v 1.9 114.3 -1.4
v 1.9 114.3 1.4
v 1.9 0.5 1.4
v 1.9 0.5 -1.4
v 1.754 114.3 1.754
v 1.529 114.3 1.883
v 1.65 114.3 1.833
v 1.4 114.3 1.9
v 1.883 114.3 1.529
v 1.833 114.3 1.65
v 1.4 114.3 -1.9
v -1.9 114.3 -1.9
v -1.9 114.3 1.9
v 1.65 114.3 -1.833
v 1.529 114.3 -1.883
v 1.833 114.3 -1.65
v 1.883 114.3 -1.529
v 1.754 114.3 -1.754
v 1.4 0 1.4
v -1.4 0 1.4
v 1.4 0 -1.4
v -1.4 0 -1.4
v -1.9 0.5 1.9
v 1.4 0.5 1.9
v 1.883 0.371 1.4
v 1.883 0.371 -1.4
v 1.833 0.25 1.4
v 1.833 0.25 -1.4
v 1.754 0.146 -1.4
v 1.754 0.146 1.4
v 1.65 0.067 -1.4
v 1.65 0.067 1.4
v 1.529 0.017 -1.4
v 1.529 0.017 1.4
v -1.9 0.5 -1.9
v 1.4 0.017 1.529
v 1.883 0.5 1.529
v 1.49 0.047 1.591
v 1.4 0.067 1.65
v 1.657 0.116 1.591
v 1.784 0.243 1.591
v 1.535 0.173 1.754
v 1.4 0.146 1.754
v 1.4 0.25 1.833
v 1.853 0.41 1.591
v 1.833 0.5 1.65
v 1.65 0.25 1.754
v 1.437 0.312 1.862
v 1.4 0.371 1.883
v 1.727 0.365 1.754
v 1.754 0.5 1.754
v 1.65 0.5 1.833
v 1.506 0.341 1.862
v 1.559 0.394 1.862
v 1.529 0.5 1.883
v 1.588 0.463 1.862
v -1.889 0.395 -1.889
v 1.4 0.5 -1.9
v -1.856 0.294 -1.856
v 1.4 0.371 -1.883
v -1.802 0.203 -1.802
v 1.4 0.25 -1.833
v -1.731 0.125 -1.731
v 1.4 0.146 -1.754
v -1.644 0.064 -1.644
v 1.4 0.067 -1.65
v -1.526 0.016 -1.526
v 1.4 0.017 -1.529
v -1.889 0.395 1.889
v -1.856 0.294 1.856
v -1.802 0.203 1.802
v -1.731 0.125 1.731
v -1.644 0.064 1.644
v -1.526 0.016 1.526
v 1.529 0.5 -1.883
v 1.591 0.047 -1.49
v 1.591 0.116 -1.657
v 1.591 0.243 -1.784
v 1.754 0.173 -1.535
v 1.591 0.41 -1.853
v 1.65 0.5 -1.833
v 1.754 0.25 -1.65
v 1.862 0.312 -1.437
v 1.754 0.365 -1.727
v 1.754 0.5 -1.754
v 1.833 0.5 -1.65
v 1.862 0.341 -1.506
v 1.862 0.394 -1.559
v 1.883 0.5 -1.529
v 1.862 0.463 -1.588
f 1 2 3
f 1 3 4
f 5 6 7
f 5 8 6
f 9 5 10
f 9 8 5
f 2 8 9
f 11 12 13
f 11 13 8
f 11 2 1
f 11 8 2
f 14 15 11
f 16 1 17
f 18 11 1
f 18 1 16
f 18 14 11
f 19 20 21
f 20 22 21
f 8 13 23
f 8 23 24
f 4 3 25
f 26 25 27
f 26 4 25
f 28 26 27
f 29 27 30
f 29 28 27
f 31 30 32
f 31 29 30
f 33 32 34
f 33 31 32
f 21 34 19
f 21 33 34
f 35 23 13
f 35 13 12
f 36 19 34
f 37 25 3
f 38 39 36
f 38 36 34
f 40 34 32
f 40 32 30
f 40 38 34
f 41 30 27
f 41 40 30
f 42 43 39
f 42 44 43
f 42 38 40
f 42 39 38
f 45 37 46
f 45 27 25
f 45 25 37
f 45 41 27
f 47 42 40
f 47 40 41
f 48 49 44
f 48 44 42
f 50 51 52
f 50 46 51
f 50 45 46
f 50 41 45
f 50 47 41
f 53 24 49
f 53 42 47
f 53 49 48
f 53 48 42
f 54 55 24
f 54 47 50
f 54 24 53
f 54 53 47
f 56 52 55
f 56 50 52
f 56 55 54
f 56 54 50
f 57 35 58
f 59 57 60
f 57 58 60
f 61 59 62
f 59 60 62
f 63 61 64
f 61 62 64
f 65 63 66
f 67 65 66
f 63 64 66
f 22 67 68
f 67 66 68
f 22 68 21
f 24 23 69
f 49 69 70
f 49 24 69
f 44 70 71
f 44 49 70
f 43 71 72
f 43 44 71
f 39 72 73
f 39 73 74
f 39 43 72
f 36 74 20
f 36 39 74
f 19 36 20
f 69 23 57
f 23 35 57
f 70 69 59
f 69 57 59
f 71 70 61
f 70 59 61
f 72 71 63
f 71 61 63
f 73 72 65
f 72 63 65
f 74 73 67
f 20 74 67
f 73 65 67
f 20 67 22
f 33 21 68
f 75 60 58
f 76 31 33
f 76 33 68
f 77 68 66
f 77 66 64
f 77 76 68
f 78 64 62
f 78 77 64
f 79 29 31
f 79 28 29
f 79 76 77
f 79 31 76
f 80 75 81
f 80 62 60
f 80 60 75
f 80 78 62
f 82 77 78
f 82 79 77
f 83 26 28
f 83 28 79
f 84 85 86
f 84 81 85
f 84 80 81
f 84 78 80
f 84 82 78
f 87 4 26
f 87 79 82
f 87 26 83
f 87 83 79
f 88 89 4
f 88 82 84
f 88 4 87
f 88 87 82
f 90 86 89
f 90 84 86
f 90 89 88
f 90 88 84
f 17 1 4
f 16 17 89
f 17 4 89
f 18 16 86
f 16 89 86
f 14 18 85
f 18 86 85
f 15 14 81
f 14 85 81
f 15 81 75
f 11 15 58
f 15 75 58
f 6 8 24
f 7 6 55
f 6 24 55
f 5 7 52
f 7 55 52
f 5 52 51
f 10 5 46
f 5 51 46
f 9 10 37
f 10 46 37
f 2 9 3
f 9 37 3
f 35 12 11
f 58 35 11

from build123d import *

# Parameters (mm, degrees)
SKETCH1_W           = 3.8
SKETCH1_H           = 3.8
BOSS_EXTRUDE1_DEPTH = 114.3
FILLET1_R           = 0.5
FILLET2_R           = 0.5


with BuildPart() as part:
    # Sketch1 → Boss-Extrude1 (new body)
    with BuildSketch(Plane(origin=(0, 0, 0), x_dir=(1, 0, 0), z_dir=(0, 1, 0))):
        Rectangle(SKETCH1_W, SKETCH1_H)
    extrude(amount=BOSS_EXTRUDE1_DEPTH)

    # Fillet1
    fillet1_edges = [part.edges().sort_by_distance(p)[0] for p in [
        (0, 0, 1.9),
        (-1.9, 0, 0),
        (0, 0, -1.9),
        (1.9, 0, 0),
    ]]
    fillet(fillet1_edges, radius=FILLET1_R)

    # Fillet2
    # the kernel refuses this fillet: 0.5 mm, written as the material it takes off along each edge
    with BuildSketch(Plane(origin=(1.4, 0.5, -1.4), x_dir=(0, 0, -1), z_dir=(1, 0, 0))) as fillet2_piece_1_section:
        Polygon((0, 0), (FILLET2_R, 0), (FILLET2_R, -FILLET2_R), (0, -FILLET2_R), align=None)
    fillet2_piece_1 = extrude(amount=FILLET2_R, mode=Mode.PRIVATE)
    fillet2_piece_1 = fillet2_piece_1 - Plane(origin=(1.4, 0.5, -1.4), x_dir=(0, 0.7071067811865475, 0.7071067811865475), z_dir=(1, 0, 0)) * Sphere(FILLET2_R, mode=Mode.PRIVATE)
    add(fillet2_piece_1, mode=Mode.SUBTRACT)
    with BuildSketch(Plane(origin=(1.4, 0.5, 1.4), x_dir=(1, 0, 0), z_dir=(0, 0, 1))) as fillet2_piece_2_section:
        Polygon((0, 0), (FILLET2_R, 0), (FILLET2_R, -FILLET2_R), (0, -FILLET2_R), align=None)
    fillet2_piece_2 = extrude(amount=FILLET2_R, mode=Mode.PRIVATE)
    fillet2_piece_2 = fillet2_piece_2 - Plane(origin=(1.4, 0.5, 1.4), x_dir=(-0.7071067811865475, 0.7071067811865475, 0), z_dir=(0, 0, 1)) * Sphere(FILLET2_R, mode=Mode.PRIVATE)
    add(fillet2_piece_2, mode=Mode.SUBTRACT)
    with BuildSketch(Plane(origin=(1.9, 0.5, 1.9), x_dir=(-1, 0, 0), z_dir=(0, 1, 0)), Plane(origin=(1.9, 0.5, -1.9), x_dir=(0, 0, 1), z_dir=(0, 1, 0))) as fillet2_piece_3:
        with BuildLine():
            CenterArc((FILLET2_R, -FILLET2_R), FILLET2_R, 90, 90)
            Line((0, -FILLET2_R), (0, 0))
            Line((0, 0), (FILLET2_R, 0))
        make_face()
    extrude(amount=115.05, mode=Mode.SUBTRACT)


solid = part.part
